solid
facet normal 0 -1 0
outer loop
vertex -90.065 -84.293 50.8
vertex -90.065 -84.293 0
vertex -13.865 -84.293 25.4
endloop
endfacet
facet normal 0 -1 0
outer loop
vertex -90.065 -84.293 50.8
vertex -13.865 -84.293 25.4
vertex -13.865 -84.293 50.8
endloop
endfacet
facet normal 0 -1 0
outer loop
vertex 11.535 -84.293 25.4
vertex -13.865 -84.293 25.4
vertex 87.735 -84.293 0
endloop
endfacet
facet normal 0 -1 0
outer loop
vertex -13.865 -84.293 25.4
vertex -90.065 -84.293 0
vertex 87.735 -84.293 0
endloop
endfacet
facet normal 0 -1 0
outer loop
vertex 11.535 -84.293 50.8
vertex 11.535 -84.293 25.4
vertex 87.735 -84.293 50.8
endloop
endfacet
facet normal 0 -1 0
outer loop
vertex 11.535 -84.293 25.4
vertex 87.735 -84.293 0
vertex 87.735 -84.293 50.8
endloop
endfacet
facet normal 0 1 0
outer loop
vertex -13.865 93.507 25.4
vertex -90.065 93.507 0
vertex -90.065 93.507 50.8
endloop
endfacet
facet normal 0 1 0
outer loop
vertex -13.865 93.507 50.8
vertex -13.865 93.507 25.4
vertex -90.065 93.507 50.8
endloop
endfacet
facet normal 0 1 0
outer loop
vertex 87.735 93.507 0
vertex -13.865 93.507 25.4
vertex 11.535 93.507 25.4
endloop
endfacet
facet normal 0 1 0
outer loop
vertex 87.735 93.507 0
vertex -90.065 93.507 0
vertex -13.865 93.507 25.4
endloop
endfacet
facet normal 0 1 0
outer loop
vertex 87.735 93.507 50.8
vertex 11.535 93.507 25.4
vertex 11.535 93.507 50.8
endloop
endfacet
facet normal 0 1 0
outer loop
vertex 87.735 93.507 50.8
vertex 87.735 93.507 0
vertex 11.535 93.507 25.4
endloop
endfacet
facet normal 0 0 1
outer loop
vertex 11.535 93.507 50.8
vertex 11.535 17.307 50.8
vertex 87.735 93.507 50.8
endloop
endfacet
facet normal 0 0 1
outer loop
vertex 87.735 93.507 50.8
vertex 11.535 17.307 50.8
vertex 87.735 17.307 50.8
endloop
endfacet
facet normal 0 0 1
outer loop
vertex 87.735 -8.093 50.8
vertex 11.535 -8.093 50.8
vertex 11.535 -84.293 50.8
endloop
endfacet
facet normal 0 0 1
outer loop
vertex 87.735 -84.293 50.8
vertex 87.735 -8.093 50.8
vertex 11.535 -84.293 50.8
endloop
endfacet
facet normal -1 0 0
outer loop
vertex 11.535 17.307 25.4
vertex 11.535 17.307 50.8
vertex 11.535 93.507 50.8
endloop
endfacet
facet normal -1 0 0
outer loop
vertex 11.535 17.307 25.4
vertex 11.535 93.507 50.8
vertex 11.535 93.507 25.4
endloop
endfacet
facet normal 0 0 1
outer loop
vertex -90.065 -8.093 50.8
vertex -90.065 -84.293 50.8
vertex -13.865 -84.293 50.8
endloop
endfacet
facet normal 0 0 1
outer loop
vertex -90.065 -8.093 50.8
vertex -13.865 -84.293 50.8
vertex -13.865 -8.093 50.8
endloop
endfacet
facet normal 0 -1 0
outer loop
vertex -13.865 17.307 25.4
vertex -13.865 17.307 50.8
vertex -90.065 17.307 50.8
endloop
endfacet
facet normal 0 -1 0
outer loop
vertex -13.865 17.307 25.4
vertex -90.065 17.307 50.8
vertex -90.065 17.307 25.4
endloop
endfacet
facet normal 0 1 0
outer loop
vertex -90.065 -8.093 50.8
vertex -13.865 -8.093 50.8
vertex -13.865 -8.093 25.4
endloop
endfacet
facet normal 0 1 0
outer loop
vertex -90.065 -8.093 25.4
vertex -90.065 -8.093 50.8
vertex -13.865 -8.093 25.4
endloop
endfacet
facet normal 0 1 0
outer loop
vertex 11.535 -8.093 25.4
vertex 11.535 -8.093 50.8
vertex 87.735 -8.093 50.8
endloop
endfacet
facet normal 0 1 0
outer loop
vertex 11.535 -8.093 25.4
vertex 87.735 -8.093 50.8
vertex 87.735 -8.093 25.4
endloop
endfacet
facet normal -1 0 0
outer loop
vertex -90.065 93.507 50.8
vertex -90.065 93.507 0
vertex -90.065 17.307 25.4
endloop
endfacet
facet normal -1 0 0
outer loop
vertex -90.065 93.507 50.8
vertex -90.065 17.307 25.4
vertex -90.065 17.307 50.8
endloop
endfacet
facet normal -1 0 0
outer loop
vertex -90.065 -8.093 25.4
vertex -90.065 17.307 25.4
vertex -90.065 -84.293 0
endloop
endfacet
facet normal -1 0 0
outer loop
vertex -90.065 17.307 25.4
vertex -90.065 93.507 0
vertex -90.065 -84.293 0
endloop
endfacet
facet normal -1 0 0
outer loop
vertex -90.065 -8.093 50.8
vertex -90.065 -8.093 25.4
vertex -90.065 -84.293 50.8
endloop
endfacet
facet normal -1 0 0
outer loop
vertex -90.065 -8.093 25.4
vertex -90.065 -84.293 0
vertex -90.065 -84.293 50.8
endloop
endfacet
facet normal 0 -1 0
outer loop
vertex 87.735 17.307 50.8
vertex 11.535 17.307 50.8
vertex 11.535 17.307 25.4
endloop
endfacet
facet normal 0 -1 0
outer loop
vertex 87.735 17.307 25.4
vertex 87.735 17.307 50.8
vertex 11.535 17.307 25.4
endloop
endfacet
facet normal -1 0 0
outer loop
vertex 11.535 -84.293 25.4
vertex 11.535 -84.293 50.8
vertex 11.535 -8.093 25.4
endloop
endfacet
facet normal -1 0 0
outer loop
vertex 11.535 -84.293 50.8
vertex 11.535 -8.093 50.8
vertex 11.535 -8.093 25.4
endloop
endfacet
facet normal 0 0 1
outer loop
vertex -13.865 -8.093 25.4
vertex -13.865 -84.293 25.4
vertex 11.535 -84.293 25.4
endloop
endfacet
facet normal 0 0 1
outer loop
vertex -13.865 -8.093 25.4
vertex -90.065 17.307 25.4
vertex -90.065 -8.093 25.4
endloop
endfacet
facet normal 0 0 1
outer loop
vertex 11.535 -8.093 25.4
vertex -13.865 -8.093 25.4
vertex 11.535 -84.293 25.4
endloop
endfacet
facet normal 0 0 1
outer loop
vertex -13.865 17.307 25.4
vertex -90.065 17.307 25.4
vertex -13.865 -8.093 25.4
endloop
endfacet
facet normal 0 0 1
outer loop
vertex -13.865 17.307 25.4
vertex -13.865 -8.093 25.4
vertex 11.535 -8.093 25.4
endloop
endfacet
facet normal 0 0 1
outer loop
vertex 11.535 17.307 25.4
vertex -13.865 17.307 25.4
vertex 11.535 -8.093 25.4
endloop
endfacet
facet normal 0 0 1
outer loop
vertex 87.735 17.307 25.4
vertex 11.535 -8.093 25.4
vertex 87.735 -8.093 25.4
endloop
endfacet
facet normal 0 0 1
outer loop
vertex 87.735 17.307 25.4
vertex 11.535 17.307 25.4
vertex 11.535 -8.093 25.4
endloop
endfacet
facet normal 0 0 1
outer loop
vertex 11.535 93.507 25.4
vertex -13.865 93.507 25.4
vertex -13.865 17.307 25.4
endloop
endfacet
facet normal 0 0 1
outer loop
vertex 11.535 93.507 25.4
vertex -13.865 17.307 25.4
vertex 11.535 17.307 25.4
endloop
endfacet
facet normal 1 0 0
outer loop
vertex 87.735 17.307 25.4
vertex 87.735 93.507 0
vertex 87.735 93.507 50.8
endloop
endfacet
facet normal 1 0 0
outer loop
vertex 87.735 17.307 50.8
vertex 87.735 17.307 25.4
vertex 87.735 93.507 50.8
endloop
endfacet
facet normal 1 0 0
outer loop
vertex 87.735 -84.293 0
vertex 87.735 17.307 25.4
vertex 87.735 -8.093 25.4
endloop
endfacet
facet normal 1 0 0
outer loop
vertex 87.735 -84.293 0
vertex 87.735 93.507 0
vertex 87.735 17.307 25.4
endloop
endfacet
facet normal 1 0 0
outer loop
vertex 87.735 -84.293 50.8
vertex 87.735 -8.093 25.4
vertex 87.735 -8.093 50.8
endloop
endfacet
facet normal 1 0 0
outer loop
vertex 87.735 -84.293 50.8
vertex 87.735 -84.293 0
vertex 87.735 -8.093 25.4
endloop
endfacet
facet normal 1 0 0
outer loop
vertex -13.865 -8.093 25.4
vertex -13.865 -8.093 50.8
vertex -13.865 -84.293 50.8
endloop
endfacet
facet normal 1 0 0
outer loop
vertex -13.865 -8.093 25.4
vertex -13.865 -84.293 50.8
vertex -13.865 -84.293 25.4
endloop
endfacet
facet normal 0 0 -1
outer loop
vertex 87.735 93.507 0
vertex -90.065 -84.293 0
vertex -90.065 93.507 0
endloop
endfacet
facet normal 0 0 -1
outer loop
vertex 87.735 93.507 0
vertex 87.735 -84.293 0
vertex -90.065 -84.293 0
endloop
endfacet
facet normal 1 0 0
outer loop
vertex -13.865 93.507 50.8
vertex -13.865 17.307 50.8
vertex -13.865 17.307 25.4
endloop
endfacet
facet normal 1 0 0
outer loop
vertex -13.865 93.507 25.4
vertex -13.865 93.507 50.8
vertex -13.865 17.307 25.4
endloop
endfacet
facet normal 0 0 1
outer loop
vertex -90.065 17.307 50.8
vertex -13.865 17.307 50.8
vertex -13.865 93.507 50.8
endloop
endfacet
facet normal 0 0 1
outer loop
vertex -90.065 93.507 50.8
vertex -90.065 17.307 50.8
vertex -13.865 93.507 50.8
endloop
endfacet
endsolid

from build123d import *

# Parameters (mm, degrees)
F0_W     = 127
F0_H     = 127
F1_DEPTH = 50.8
F3_DEPTH = 25.4
F4_DEPTH = 25.4
F5_DEPTH = 25.4
F6_DEPTH = 25.4
F7_DEPTH = 25.4


with BuildPart() as f1:
    # F0 (on Top) → F1 (new body)
    with BuildSketch(Plane.XY):
        with Locations((-1.1648386717, 4.6072422095)):
            Rectangle(F0_W, F0_H)
    extrude(amount=F1_DEPTH)

    # F2 (on face) → F3 (cut)
    with BuildSketch(Plane.XY.offset(50.8)):
        Polygon((11.5351613283, 68.1072422095), (-13.8648386717, 68.1072422095), (-13.8648386717, 17.3072422095), (-64.6648386717, 17.3072422095), (-64.6648386717, -8.0927577905), (-13.8648386717, -8.0927577905), (-13.8648386717, -58.8927577905), (11.5351613283, -58.8927577905), (11.5351613283, -8.0927577905), (62.3351613283, -8.0927577905), (62.3351613283, 17.3072422095), (11.5351613283, 17.3072422095), align=None)
    extrude(amount=-F3_DEPTH, mode=Mode.SUBTRACT)

    # F4 (add): a face of the model
    f4_faces = [f1.faces().sort_by_distance(p)[0] for p in [
        (-1.1648386717, -58.8927577905, 23.9888888889),
    ]]
    extrude(f4_faces, amount=F4_DEPTH)

    # F5 (add): a face of the model
    f5_faces = [f1.faces().sort_by_distance(p)[0] for p in [
        (62.3351613283, -9.247303245, 24.2454545455),
    ]]
    extrude(f5_faces, amount=F5_DEPTH)

    # F6 (add): a face of the model
    f6_faces = [f1.faces().sort_by_distance(p)[0] for p in [
        (12.6897067829, 68.1072422095, 24.2454545455),
    ]]
    extrude(f6_faces, amount=F6_DEPTH)

    # F7 (add): a face of the model
    f7_faces = [f1.faces().sort_by_distance(p)[0] for p in [
        (-64.6648386717, 4.6072422095, 24.4230769231),
    ]]
    extrude(f7_faces, amount=F7_DEPTH)


solid = f1.part
